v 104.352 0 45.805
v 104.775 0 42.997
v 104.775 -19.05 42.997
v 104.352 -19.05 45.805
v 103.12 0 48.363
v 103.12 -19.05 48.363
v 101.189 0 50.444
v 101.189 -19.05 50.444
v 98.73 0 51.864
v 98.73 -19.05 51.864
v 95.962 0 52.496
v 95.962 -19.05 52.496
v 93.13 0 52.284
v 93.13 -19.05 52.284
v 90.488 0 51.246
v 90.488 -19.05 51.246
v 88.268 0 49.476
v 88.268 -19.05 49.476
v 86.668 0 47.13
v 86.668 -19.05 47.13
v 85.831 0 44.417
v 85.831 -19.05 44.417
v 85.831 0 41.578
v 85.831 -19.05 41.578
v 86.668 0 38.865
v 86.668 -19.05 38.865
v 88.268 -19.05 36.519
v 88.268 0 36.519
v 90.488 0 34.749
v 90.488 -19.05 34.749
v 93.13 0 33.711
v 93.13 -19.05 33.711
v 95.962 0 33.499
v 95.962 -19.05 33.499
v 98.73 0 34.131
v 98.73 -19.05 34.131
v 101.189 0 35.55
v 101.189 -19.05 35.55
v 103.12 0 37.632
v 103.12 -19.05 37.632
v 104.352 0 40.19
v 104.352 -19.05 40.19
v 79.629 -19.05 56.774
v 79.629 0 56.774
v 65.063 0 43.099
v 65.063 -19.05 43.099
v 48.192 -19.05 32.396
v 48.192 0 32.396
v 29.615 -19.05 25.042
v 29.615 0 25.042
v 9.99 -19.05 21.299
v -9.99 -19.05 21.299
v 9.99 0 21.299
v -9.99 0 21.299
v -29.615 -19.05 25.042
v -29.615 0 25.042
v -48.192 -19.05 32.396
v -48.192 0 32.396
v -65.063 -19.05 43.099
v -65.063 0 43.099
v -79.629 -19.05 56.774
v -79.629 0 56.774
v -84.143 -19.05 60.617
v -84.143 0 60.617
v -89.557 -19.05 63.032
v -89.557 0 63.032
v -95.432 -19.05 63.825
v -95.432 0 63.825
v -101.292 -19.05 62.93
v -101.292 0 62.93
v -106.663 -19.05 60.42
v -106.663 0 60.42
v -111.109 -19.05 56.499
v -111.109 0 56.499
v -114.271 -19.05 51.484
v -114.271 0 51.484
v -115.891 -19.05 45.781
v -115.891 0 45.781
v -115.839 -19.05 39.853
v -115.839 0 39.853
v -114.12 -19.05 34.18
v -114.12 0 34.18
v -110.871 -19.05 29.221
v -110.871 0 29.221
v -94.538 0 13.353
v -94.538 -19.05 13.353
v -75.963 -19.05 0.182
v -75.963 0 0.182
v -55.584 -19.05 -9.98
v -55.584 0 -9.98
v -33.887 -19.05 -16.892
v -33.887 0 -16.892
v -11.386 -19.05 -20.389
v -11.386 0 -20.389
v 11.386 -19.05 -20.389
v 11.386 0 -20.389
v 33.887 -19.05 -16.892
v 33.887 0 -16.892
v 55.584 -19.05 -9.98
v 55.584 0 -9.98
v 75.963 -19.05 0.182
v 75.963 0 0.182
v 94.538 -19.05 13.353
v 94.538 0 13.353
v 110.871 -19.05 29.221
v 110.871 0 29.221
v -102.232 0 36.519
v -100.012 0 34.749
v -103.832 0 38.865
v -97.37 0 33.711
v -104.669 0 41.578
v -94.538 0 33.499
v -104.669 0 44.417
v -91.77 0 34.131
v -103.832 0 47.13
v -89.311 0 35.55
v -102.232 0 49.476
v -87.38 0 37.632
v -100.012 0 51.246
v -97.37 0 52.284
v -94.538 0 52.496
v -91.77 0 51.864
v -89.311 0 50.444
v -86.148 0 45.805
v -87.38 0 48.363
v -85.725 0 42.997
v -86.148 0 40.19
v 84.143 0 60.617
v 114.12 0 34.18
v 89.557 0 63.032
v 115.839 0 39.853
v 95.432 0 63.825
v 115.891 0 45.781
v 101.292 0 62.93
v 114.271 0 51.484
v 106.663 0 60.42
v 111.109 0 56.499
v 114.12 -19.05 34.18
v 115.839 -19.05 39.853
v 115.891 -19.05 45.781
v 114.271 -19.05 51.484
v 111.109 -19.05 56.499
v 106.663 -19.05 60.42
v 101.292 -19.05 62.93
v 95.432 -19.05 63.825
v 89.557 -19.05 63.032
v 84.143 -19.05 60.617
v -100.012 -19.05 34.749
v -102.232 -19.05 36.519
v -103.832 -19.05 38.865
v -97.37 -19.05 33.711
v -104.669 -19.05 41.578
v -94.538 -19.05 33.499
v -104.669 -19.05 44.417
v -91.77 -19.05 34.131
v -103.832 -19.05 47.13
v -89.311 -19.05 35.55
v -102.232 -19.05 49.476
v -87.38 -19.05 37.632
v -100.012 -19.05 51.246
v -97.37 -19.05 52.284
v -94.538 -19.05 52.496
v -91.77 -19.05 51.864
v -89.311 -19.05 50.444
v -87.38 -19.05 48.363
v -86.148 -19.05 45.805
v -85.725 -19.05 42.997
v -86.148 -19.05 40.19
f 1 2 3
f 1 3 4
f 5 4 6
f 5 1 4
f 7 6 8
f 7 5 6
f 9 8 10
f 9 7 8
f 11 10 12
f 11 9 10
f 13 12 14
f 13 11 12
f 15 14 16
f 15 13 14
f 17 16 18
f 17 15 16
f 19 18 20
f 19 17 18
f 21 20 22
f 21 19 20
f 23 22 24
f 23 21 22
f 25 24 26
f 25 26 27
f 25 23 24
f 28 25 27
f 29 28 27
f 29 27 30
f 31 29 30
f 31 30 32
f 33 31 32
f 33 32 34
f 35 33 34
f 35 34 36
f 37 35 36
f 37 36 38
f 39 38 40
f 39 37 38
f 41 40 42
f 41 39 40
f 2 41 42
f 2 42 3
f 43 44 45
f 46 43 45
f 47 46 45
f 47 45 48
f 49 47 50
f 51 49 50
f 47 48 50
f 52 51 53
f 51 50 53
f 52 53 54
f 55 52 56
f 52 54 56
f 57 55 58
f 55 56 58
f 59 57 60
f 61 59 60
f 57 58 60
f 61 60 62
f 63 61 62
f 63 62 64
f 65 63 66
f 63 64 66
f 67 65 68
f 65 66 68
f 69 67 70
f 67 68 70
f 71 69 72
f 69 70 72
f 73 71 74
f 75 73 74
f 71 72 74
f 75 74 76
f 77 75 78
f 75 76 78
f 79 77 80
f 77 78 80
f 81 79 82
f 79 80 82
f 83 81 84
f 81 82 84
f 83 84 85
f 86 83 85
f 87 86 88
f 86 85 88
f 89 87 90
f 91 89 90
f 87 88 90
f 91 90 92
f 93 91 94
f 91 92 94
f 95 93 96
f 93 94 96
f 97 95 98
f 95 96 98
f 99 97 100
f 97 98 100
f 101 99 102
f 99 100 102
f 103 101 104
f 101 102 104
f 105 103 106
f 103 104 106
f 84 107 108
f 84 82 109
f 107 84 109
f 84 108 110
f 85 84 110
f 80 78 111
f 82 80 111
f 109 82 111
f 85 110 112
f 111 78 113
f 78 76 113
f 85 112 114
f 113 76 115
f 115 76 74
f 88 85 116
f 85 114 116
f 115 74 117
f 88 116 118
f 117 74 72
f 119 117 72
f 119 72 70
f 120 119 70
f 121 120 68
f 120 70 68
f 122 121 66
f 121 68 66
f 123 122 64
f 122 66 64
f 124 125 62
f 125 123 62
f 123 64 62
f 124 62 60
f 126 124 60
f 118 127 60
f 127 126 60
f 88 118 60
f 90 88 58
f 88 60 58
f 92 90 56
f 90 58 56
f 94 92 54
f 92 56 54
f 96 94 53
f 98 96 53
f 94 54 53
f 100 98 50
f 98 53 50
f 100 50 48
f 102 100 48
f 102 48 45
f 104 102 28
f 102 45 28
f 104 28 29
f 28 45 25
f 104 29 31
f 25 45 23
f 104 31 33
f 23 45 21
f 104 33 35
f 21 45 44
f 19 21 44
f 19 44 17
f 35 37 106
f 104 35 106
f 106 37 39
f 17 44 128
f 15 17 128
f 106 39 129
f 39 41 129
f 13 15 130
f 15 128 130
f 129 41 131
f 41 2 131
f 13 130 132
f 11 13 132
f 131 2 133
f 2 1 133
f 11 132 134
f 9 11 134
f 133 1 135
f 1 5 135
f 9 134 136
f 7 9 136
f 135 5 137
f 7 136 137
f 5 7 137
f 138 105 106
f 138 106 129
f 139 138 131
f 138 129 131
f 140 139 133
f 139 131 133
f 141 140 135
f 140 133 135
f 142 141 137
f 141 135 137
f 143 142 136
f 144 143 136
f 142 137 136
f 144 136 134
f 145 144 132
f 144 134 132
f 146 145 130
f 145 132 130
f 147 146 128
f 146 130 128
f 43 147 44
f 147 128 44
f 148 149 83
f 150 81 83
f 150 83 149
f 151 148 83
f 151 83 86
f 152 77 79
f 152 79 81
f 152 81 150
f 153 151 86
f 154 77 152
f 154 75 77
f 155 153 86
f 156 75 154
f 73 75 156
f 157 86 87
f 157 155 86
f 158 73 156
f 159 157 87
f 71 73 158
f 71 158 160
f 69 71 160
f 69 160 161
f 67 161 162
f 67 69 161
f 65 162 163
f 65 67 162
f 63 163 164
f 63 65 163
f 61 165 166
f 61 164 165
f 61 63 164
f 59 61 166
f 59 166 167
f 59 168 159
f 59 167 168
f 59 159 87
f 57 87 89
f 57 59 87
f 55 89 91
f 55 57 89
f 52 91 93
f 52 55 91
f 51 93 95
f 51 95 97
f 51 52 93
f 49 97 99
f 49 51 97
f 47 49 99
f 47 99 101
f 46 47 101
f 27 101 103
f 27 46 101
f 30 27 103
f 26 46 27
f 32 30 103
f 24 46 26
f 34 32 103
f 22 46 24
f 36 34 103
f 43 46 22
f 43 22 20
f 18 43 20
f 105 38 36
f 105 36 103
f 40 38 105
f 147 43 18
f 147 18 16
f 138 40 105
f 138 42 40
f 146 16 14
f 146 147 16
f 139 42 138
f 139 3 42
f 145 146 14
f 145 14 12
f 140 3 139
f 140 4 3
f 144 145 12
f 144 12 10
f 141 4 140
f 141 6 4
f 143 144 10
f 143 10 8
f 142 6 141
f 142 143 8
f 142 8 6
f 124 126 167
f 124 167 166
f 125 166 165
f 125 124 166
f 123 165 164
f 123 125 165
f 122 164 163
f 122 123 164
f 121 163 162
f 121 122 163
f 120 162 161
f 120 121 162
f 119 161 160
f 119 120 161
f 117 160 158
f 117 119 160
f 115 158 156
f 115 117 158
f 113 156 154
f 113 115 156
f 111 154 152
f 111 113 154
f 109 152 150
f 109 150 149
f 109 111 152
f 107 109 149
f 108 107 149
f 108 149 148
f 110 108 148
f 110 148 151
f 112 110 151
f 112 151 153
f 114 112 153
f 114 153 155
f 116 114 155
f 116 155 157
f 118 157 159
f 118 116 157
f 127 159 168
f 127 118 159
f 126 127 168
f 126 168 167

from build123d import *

# Parameters (mm, degrees)
F0_R     = 9.525
F1_DEPTH = 19.05


with BuildPart() as f1:
    # F0 (on Front) → F1 (new body)
    with BuildSketch(Plane.XZ):
        with BuildLine():
            ThreePointArc((-79.629, 56.773823), (-109.026427, 58.618396), (-110.871, 29.220969))
            ThreePointArc((-110.871, 29.220969), (0, -20.828), (110.871, 29.220969))
            ThreePointArc((110.871, 29.220969), (109.026427, 58.618396), (79.629, 56.773823))
            ThreePointArc((79.629, 56.773823), (0, 20.828), (-79.629, 56.773823))
        make_face()
        with Locations((-95.25, 42.997396)):
            Circle(F0_R, mode=Mode.SUBTRACT)
        with Locations((95.25, 42.997396)):
            Circle(F0_R, mode=Mode.SUBTRACT)
    extrude(amount=F1_DEPTH)


solid = f1.part
